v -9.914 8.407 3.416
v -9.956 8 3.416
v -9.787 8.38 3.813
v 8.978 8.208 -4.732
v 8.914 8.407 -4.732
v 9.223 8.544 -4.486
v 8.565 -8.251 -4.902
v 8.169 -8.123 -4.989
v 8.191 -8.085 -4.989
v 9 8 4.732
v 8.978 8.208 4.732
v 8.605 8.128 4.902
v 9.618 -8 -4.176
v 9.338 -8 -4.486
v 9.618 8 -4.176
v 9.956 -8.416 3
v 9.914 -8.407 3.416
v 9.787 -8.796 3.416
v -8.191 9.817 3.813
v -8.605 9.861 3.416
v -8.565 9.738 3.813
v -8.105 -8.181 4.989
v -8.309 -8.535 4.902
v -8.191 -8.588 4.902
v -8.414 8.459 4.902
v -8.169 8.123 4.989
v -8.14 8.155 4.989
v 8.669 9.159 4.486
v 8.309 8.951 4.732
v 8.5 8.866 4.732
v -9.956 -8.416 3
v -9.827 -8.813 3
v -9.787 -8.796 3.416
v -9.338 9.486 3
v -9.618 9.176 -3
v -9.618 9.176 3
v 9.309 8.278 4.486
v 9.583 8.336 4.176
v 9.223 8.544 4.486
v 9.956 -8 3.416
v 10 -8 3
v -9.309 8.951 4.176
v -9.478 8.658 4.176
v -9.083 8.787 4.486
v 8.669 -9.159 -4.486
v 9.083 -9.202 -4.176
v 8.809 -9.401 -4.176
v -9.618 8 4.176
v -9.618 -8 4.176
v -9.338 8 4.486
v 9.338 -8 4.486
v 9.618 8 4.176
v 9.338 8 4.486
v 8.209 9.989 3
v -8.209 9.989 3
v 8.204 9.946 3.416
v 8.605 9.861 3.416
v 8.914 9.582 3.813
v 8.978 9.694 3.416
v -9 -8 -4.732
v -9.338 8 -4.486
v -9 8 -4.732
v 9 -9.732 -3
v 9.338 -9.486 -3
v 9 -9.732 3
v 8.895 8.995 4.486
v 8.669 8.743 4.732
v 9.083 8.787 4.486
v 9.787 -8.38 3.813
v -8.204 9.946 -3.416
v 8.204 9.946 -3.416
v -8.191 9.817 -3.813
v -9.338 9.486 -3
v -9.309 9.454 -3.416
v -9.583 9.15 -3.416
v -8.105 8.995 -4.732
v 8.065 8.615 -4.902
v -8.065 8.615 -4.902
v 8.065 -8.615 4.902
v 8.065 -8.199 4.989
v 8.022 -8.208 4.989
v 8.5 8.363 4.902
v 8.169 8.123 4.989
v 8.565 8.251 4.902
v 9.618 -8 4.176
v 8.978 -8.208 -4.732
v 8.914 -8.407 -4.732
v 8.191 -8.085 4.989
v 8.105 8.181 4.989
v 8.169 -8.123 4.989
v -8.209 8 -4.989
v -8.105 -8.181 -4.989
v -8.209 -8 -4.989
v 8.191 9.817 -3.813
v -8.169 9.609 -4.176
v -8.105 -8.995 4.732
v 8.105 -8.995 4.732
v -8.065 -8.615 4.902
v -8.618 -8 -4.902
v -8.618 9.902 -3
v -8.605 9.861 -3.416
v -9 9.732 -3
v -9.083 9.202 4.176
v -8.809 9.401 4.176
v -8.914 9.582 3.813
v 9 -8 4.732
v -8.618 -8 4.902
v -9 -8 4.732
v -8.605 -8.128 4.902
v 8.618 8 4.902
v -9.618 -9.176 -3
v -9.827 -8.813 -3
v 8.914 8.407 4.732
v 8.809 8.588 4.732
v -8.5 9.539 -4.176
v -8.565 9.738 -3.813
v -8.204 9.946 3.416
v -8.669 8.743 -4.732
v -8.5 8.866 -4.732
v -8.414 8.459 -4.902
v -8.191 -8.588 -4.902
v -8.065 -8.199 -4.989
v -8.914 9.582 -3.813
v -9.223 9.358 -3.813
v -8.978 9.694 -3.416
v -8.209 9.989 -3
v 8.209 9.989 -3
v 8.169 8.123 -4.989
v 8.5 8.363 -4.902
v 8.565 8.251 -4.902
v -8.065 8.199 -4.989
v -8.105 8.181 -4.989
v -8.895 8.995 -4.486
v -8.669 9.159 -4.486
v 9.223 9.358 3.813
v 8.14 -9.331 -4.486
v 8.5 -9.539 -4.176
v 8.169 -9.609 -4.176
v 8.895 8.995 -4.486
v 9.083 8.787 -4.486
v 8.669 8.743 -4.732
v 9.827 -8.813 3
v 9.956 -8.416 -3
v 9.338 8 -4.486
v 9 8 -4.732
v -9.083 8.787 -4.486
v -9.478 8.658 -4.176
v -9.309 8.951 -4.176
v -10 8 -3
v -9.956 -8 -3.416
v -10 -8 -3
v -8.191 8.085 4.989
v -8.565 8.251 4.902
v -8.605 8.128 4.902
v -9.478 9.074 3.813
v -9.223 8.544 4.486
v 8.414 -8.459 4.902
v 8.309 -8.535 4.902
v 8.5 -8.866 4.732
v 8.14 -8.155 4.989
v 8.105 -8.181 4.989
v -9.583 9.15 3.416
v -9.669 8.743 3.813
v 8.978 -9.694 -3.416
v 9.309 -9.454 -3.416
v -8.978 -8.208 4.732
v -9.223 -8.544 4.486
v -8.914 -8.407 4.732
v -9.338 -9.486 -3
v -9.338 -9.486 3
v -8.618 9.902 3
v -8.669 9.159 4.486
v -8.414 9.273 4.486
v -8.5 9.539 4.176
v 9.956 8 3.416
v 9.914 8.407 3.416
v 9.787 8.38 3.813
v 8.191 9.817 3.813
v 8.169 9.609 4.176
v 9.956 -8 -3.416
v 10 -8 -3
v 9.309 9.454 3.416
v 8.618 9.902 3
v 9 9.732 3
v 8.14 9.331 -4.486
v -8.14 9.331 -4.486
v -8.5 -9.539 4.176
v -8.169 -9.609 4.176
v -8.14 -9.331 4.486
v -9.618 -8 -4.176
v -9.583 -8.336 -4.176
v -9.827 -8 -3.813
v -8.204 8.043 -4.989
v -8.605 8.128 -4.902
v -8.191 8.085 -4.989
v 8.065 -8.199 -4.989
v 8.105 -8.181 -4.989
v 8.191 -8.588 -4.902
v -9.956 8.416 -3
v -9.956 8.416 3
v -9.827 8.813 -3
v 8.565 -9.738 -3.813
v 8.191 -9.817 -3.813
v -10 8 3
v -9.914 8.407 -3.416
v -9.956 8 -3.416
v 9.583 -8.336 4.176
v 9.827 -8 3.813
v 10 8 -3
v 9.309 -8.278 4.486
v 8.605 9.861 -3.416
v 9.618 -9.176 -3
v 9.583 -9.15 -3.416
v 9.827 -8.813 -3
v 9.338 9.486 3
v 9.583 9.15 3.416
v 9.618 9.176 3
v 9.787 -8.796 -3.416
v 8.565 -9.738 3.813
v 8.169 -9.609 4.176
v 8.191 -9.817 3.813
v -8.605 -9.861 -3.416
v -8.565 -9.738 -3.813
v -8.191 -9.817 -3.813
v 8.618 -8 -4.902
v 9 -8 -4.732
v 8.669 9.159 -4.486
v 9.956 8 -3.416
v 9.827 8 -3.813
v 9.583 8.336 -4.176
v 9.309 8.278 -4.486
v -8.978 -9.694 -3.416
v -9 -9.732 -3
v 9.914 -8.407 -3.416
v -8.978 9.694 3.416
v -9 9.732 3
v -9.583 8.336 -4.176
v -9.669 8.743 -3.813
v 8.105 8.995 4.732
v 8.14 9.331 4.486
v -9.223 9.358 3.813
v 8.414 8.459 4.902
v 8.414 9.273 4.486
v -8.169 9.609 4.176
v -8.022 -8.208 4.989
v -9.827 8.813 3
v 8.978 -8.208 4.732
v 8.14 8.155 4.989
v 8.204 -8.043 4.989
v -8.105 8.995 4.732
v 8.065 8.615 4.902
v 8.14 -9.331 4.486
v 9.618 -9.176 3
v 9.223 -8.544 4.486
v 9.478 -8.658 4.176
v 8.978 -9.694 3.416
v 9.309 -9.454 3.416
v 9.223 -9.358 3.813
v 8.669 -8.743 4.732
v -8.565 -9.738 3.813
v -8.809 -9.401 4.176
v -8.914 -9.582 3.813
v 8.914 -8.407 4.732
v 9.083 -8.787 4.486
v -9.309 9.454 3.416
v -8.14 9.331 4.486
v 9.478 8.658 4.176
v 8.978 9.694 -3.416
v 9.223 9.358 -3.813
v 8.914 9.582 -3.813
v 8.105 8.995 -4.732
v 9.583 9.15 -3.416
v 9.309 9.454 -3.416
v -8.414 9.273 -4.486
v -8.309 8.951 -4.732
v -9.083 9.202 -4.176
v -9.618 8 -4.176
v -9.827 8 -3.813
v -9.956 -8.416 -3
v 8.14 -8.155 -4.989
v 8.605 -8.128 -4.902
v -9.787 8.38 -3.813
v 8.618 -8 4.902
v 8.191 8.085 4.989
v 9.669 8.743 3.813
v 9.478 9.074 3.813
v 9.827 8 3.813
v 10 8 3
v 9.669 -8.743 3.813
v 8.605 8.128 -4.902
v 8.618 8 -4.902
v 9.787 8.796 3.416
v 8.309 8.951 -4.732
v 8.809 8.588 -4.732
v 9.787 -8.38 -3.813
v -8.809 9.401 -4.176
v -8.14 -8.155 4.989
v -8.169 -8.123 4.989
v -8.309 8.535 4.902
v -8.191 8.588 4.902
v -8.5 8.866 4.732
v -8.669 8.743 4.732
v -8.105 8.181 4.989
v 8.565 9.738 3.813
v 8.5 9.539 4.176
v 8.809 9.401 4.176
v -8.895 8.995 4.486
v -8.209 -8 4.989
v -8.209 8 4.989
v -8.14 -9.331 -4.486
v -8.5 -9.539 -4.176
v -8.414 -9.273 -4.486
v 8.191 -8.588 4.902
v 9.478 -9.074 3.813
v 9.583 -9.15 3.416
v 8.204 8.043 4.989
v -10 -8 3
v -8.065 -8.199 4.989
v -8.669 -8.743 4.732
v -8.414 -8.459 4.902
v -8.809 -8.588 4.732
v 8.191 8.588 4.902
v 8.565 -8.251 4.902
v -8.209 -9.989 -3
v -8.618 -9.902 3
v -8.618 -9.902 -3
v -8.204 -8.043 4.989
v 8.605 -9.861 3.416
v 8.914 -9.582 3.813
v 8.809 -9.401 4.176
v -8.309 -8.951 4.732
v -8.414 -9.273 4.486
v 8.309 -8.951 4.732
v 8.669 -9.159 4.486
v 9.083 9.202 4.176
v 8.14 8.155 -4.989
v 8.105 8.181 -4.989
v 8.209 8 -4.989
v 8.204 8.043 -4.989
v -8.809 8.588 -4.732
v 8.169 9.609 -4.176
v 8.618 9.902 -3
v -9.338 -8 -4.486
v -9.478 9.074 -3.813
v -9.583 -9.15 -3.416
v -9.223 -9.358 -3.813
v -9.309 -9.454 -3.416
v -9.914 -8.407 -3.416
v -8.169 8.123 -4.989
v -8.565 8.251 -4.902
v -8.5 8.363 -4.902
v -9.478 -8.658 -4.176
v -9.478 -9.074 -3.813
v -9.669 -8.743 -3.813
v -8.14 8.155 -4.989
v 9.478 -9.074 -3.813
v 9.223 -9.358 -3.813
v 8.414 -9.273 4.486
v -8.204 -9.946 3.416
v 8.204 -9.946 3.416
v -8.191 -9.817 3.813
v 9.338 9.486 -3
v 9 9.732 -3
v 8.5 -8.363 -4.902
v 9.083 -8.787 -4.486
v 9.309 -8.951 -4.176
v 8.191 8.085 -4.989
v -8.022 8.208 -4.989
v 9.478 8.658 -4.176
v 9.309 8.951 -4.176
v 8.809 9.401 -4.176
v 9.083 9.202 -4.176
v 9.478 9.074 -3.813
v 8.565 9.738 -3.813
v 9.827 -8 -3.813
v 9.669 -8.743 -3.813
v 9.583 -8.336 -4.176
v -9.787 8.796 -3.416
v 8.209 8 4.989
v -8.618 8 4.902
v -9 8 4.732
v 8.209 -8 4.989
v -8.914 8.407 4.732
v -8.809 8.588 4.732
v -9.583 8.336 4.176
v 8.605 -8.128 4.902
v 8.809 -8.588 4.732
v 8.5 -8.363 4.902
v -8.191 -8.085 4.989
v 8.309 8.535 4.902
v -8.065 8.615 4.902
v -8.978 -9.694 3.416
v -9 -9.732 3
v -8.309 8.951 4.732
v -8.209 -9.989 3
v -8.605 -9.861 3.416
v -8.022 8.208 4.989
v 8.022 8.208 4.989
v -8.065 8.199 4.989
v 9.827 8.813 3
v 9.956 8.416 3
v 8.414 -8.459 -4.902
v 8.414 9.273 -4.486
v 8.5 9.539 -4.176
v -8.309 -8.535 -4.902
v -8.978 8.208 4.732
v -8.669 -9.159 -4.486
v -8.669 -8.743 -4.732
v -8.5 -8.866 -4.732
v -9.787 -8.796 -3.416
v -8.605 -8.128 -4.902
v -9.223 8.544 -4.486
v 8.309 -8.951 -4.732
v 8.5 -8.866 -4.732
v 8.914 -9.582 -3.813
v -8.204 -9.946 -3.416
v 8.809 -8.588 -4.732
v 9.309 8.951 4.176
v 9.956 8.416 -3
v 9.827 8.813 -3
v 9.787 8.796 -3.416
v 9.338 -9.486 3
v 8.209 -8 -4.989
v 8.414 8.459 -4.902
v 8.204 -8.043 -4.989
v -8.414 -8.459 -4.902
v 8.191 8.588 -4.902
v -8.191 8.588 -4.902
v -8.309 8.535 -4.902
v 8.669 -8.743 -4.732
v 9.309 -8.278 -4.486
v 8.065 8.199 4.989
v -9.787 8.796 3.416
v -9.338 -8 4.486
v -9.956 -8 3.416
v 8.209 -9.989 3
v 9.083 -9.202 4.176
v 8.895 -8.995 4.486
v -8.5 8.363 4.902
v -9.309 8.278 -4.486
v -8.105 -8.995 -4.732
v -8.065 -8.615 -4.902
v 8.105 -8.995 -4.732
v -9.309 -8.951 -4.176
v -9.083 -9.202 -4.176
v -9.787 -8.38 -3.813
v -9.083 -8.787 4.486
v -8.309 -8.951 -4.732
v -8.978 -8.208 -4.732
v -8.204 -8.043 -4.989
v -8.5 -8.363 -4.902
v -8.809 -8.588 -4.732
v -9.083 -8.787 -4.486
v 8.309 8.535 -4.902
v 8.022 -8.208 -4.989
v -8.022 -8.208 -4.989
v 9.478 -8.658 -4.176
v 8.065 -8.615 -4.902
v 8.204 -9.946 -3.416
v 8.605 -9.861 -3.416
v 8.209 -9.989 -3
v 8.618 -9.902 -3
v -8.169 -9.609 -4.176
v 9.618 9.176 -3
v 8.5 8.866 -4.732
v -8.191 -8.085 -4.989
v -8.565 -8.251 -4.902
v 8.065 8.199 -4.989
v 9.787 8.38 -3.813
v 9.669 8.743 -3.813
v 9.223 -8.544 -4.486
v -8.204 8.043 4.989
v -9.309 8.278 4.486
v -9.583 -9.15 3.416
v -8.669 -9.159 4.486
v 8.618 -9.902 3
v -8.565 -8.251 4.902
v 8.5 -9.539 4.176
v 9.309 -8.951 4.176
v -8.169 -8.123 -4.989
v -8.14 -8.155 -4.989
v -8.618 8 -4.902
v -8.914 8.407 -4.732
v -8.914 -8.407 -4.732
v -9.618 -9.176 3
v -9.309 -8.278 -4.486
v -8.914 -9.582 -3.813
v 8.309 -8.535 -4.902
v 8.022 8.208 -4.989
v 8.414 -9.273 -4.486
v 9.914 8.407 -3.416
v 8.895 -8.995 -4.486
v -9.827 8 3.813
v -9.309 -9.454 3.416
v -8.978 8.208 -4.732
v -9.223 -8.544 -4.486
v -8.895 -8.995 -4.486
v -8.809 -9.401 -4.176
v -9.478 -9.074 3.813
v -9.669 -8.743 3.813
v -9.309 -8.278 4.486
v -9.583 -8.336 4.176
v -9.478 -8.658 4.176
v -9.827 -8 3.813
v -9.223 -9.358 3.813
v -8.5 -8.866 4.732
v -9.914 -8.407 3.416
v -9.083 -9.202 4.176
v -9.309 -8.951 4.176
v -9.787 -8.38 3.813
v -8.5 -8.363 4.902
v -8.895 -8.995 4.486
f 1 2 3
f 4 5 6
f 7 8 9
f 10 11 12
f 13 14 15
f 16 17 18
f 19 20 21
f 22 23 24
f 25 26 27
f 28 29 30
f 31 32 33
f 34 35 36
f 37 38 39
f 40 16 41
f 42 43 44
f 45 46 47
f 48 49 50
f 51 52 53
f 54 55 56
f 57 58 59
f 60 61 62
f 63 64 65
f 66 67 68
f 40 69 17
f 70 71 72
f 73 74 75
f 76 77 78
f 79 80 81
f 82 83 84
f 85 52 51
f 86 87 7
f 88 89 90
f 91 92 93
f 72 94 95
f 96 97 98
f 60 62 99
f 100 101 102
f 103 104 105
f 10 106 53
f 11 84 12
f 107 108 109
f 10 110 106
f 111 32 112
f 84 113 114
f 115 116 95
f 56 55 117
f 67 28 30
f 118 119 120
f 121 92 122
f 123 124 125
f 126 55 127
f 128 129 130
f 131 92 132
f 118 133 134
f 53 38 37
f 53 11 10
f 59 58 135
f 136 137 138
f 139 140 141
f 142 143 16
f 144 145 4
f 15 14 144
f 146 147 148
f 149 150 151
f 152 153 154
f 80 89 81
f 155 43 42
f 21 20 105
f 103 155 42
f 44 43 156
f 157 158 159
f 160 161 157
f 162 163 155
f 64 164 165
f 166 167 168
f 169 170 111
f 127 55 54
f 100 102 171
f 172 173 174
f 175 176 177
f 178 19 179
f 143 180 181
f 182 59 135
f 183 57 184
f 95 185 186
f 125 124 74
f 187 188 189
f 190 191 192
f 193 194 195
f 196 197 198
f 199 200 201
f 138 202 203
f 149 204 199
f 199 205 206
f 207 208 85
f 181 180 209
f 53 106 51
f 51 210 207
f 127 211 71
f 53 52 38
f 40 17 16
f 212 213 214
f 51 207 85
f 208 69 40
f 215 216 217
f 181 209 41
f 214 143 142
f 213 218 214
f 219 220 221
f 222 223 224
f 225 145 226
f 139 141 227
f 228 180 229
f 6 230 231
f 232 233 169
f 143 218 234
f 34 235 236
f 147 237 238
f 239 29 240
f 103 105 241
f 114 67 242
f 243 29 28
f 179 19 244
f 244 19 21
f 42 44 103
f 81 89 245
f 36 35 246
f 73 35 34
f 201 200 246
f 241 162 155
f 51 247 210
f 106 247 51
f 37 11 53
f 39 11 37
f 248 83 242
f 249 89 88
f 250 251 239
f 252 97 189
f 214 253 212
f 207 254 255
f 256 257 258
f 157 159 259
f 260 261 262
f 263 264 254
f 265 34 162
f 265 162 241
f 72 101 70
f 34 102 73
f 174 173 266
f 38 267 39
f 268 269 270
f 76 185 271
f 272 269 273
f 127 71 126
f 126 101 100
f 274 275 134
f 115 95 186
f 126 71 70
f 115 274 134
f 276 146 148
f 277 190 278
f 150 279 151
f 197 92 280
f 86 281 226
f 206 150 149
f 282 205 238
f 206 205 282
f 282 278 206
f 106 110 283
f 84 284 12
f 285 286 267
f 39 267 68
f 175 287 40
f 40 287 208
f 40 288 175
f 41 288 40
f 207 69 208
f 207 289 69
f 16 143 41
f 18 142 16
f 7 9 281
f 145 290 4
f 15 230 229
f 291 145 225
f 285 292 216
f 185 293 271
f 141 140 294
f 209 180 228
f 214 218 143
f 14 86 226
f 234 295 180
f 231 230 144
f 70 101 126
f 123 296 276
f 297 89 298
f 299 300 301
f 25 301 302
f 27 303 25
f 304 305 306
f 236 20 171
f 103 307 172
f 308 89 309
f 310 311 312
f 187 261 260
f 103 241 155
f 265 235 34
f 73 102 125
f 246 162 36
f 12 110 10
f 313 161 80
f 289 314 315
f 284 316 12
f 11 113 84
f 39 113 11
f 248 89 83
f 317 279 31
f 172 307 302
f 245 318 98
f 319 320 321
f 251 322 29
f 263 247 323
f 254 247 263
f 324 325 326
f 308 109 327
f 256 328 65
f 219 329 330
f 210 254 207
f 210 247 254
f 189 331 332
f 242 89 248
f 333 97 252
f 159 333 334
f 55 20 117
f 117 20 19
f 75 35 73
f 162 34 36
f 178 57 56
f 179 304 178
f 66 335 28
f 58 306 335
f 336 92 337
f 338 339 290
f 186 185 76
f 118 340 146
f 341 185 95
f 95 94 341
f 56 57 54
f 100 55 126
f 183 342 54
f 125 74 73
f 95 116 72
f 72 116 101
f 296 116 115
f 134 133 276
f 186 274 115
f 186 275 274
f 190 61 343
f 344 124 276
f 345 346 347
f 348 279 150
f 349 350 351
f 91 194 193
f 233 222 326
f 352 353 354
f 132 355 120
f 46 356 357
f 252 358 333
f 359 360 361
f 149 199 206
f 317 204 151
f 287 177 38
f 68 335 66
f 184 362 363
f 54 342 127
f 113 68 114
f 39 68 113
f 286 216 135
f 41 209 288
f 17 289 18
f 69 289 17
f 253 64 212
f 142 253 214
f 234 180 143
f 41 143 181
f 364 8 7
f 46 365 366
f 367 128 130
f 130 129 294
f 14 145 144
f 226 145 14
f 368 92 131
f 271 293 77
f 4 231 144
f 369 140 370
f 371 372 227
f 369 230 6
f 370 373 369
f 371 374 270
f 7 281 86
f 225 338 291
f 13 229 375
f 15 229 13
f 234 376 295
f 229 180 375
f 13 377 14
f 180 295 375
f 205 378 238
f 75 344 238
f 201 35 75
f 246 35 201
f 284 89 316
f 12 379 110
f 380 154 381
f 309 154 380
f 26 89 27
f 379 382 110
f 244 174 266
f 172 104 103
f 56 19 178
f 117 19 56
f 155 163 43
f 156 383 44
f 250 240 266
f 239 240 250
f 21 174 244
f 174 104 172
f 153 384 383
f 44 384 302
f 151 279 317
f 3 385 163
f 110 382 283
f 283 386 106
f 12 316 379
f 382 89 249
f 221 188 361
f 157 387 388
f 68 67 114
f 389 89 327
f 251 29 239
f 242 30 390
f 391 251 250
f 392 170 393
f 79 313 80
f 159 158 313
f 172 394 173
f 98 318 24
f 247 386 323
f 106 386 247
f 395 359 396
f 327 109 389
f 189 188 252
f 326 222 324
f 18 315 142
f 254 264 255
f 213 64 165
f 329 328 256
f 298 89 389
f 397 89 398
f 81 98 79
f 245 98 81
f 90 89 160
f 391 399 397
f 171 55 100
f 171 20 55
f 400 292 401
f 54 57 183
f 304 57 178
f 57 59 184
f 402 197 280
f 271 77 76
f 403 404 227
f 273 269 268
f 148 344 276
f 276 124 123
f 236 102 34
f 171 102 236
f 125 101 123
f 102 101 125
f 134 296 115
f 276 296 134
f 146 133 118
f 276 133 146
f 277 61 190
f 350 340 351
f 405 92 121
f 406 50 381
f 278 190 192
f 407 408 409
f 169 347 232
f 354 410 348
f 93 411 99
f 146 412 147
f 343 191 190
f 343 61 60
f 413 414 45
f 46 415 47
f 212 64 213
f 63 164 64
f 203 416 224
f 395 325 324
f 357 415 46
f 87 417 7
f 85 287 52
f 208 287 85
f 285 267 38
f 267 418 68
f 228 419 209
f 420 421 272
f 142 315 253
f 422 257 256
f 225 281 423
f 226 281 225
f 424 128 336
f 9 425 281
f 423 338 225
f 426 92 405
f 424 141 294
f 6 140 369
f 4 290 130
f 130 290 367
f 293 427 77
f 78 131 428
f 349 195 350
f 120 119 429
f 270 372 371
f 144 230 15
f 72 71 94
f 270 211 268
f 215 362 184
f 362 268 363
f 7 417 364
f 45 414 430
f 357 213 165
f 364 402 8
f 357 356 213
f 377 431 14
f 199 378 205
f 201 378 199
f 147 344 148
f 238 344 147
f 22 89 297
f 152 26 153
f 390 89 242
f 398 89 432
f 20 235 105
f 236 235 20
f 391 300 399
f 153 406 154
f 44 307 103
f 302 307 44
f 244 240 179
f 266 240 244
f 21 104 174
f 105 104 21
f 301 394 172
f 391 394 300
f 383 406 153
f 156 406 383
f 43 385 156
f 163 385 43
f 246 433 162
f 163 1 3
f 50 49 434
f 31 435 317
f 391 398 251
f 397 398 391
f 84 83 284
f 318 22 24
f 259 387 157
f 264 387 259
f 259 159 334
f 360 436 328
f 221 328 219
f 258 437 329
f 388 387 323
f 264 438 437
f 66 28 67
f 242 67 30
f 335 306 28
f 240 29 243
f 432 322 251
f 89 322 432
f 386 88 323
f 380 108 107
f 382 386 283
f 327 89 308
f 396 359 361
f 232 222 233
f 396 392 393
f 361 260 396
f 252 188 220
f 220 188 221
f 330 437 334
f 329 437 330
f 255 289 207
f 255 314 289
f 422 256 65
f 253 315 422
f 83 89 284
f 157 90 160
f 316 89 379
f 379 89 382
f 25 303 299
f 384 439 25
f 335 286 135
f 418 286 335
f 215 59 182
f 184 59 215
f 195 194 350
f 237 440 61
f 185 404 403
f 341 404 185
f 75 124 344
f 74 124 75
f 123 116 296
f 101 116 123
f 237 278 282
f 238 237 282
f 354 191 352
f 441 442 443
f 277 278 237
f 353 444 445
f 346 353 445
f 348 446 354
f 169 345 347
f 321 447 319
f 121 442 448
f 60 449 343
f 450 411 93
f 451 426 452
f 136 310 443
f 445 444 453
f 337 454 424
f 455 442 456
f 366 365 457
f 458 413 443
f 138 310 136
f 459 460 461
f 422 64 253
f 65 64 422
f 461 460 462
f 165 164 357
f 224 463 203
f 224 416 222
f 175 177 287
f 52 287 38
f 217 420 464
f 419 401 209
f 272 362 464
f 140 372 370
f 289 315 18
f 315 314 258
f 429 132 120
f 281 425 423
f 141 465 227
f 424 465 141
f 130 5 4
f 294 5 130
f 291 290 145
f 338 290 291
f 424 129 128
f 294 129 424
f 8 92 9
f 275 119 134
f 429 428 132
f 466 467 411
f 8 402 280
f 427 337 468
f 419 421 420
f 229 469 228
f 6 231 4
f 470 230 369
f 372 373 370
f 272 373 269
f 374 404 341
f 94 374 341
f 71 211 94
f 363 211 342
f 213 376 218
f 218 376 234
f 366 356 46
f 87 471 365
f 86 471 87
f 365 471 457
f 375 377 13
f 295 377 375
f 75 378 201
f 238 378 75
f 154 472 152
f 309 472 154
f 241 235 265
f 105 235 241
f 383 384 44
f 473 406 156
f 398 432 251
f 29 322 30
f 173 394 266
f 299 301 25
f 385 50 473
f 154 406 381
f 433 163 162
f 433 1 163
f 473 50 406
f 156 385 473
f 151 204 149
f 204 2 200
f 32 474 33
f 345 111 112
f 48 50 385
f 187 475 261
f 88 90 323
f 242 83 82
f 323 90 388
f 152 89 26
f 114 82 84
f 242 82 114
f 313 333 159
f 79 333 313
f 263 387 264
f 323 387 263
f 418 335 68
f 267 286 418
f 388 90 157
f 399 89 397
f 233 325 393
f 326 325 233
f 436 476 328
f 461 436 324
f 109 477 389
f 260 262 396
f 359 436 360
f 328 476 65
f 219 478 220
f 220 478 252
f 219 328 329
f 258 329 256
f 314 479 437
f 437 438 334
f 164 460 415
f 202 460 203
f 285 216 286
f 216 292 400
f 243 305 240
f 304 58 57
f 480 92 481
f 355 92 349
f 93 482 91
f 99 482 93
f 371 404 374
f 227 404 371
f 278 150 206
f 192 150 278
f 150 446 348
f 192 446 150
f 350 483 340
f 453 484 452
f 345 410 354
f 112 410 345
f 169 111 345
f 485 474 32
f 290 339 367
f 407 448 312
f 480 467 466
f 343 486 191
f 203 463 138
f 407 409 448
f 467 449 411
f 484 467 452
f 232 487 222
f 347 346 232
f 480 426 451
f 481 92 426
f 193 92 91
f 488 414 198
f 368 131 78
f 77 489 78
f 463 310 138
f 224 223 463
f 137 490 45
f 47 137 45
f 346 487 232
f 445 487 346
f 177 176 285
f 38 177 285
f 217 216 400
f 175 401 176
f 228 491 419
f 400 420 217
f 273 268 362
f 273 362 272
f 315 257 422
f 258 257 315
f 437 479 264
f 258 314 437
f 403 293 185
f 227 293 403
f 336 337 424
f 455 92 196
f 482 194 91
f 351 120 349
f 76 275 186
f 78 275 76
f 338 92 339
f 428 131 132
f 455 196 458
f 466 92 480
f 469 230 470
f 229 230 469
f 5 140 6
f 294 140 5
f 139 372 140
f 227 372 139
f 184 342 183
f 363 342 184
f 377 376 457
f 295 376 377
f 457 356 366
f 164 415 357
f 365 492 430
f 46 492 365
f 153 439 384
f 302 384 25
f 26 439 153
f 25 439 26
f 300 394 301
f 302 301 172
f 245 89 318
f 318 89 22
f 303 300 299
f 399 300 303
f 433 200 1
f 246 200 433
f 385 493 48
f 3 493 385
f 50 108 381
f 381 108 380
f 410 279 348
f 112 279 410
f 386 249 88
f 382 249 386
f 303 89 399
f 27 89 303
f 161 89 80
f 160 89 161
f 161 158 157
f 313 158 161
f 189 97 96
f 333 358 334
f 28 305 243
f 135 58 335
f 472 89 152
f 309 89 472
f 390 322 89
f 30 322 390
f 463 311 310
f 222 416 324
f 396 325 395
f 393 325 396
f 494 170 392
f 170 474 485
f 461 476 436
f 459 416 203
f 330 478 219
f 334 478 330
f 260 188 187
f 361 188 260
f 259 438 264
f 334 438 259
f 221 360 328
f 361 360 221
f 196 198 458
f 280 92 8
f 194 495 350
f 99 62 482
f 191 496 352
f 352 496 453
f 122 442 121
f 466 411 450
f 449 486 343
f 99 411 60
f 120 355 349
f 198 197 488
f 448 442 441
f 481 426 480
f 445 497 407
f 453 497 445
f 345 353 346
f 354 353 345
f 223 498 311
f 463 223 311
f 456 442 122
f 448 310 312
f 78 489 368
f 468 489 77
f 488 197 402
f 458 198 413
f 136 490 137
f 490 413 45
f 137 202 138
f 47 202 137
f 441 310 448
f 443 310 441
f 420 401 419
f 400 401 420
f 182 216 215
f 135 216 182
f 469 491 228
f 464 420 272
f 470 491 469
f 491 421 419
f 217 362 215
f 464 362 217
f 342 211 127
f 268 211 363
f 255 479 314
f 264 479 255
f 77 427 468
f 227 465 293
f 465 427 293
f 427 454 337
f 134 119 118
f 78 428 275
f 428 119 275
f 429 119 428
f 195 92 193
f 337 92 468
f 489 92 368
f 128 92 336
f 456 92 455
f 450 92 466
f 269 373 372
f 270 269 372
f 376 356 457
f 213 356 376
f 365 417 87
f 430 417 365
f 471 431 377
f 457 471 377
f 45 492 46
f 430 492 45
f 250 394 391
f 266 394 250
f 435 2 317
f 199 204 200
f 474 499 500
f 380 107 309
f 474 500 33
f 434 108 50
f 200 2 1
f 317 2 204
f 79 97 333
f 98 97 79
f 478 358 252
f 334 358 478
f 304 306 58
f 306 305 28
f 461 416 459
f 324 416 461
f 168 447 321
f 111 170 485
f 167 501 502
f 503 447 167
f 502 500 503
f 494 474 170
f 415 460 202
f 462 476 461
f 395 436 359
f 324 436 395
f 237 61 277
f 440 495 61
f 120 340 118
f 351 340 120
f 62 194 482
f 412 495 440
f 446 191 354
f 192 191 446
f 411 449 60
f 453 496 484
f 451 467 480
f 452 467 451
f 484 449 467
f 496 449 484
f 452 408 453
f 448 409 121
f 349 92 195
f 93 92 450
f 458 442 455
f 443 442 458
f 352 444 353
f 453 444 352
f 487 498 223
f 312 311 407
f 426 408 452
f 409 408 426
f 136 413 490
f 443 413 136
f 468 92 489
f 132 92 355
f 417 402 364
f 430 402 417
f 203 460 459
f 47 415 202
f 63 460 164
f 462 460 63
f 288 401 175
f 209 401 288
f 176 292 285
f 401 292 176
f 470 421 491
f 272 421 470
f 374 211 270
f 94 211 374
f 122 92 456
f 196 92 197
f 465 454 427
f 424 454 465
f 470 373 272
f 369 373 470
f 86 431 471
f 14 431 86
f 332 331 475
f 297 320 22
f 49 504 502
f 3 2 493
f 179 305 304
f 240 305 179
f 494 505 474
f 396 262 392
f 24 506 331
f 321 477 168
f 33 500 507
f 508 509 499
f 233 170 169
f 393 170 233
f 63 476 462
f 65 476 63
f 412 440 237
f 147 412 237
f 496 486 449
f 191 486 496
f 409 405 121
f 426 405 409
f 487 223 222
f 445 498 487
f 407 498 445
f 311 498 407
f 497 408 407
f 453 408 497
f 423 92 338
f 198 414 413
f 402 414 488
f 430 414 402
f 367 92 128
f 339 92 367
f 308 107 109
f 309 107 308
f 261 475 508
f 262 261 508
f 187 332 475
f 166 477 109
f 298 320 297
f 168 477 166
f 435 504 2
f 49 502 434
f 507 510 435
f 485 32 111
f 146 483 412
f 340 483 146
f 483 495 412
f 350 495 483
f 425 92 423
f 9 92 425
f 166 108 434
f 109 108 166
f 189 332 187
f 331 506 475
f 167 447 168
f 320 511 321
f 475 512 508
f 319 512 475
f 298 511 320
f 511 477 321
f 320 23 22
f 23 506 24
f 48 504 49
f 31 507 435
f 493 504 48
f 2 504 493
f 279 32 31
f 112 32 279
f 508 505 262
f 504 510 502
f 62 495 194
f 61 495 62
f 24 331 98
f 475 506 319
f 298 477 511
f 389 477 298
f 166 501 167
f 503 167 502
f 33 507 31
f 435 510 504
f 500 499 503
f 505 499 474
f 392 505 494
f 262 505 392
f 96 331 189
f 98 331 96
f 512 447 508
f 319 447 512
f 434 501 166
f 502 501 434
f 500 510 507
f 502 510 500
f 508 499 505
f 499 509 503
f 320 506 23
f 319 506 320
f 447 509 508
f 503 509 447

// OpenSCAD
// Rounded Corners using Minkowski + Sphere
// Best method for uniform rounding of all edges

$fn = 30;
r = 2;  // Rounding radius

minkowski() {
    // Original shape (reduced by 2*r in each dimension)
    cube([16, 16, 6], center=true);
    
    // Rounding sphere
    sphere(r=r);
}

// Result: 20x20x10 cube with all edges rounded
// Final size = original + 2*r in each dimension
